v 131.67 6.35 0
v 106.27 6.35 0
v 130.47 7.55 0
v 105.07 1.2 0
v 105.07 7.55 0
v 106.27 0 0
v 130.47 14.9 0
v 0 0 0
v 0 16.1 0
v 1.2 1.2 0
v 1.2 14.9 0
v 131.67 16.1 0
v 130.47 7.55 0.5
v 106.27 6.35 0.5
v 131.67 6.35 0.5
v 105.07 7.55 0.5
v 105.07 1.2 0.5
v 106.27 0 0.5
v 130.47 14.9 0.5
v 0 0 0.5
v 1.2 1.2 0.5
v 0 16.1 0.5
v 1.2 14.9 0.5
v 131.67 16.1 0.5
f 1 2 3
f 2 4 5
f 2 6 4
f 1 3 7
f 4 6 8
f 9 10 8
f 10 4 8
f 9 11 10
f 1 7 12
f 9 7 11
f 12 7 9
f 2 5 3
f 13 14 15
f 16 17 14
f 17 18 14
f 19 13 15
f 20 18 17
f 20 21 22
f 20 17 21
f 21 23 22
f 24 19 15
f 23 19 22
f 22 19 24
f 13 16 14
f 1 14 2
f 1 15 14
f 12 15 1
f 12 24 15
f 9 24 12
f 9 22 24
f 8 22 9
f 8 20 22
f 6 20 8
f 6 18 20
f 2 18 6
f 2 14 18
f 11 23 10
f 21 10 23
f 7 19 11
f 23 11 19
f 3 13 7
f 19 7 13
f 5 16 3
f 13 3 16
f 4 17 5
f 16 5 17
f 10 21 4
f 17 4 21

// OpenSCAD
inch=25.4;

module mobile_sata(){
    union(){
        translate([0,0.25*inch,0])
        square([5.05*inch,0.25*inch]);
        square([4.05*inch,0.25*inch+0.001]);
    }
}

linear_extrude(0.5,convexity=10)
translate([1.2+0.5,1.2+0.5,0])
    difference(){
        offset(delta=1.2+0.5)
        mobile_sata();
        offset(delta=0.5)
        mobile_sata();
    }

//translate([1.2,1.2,1.2])
  //  mobile_sata();
